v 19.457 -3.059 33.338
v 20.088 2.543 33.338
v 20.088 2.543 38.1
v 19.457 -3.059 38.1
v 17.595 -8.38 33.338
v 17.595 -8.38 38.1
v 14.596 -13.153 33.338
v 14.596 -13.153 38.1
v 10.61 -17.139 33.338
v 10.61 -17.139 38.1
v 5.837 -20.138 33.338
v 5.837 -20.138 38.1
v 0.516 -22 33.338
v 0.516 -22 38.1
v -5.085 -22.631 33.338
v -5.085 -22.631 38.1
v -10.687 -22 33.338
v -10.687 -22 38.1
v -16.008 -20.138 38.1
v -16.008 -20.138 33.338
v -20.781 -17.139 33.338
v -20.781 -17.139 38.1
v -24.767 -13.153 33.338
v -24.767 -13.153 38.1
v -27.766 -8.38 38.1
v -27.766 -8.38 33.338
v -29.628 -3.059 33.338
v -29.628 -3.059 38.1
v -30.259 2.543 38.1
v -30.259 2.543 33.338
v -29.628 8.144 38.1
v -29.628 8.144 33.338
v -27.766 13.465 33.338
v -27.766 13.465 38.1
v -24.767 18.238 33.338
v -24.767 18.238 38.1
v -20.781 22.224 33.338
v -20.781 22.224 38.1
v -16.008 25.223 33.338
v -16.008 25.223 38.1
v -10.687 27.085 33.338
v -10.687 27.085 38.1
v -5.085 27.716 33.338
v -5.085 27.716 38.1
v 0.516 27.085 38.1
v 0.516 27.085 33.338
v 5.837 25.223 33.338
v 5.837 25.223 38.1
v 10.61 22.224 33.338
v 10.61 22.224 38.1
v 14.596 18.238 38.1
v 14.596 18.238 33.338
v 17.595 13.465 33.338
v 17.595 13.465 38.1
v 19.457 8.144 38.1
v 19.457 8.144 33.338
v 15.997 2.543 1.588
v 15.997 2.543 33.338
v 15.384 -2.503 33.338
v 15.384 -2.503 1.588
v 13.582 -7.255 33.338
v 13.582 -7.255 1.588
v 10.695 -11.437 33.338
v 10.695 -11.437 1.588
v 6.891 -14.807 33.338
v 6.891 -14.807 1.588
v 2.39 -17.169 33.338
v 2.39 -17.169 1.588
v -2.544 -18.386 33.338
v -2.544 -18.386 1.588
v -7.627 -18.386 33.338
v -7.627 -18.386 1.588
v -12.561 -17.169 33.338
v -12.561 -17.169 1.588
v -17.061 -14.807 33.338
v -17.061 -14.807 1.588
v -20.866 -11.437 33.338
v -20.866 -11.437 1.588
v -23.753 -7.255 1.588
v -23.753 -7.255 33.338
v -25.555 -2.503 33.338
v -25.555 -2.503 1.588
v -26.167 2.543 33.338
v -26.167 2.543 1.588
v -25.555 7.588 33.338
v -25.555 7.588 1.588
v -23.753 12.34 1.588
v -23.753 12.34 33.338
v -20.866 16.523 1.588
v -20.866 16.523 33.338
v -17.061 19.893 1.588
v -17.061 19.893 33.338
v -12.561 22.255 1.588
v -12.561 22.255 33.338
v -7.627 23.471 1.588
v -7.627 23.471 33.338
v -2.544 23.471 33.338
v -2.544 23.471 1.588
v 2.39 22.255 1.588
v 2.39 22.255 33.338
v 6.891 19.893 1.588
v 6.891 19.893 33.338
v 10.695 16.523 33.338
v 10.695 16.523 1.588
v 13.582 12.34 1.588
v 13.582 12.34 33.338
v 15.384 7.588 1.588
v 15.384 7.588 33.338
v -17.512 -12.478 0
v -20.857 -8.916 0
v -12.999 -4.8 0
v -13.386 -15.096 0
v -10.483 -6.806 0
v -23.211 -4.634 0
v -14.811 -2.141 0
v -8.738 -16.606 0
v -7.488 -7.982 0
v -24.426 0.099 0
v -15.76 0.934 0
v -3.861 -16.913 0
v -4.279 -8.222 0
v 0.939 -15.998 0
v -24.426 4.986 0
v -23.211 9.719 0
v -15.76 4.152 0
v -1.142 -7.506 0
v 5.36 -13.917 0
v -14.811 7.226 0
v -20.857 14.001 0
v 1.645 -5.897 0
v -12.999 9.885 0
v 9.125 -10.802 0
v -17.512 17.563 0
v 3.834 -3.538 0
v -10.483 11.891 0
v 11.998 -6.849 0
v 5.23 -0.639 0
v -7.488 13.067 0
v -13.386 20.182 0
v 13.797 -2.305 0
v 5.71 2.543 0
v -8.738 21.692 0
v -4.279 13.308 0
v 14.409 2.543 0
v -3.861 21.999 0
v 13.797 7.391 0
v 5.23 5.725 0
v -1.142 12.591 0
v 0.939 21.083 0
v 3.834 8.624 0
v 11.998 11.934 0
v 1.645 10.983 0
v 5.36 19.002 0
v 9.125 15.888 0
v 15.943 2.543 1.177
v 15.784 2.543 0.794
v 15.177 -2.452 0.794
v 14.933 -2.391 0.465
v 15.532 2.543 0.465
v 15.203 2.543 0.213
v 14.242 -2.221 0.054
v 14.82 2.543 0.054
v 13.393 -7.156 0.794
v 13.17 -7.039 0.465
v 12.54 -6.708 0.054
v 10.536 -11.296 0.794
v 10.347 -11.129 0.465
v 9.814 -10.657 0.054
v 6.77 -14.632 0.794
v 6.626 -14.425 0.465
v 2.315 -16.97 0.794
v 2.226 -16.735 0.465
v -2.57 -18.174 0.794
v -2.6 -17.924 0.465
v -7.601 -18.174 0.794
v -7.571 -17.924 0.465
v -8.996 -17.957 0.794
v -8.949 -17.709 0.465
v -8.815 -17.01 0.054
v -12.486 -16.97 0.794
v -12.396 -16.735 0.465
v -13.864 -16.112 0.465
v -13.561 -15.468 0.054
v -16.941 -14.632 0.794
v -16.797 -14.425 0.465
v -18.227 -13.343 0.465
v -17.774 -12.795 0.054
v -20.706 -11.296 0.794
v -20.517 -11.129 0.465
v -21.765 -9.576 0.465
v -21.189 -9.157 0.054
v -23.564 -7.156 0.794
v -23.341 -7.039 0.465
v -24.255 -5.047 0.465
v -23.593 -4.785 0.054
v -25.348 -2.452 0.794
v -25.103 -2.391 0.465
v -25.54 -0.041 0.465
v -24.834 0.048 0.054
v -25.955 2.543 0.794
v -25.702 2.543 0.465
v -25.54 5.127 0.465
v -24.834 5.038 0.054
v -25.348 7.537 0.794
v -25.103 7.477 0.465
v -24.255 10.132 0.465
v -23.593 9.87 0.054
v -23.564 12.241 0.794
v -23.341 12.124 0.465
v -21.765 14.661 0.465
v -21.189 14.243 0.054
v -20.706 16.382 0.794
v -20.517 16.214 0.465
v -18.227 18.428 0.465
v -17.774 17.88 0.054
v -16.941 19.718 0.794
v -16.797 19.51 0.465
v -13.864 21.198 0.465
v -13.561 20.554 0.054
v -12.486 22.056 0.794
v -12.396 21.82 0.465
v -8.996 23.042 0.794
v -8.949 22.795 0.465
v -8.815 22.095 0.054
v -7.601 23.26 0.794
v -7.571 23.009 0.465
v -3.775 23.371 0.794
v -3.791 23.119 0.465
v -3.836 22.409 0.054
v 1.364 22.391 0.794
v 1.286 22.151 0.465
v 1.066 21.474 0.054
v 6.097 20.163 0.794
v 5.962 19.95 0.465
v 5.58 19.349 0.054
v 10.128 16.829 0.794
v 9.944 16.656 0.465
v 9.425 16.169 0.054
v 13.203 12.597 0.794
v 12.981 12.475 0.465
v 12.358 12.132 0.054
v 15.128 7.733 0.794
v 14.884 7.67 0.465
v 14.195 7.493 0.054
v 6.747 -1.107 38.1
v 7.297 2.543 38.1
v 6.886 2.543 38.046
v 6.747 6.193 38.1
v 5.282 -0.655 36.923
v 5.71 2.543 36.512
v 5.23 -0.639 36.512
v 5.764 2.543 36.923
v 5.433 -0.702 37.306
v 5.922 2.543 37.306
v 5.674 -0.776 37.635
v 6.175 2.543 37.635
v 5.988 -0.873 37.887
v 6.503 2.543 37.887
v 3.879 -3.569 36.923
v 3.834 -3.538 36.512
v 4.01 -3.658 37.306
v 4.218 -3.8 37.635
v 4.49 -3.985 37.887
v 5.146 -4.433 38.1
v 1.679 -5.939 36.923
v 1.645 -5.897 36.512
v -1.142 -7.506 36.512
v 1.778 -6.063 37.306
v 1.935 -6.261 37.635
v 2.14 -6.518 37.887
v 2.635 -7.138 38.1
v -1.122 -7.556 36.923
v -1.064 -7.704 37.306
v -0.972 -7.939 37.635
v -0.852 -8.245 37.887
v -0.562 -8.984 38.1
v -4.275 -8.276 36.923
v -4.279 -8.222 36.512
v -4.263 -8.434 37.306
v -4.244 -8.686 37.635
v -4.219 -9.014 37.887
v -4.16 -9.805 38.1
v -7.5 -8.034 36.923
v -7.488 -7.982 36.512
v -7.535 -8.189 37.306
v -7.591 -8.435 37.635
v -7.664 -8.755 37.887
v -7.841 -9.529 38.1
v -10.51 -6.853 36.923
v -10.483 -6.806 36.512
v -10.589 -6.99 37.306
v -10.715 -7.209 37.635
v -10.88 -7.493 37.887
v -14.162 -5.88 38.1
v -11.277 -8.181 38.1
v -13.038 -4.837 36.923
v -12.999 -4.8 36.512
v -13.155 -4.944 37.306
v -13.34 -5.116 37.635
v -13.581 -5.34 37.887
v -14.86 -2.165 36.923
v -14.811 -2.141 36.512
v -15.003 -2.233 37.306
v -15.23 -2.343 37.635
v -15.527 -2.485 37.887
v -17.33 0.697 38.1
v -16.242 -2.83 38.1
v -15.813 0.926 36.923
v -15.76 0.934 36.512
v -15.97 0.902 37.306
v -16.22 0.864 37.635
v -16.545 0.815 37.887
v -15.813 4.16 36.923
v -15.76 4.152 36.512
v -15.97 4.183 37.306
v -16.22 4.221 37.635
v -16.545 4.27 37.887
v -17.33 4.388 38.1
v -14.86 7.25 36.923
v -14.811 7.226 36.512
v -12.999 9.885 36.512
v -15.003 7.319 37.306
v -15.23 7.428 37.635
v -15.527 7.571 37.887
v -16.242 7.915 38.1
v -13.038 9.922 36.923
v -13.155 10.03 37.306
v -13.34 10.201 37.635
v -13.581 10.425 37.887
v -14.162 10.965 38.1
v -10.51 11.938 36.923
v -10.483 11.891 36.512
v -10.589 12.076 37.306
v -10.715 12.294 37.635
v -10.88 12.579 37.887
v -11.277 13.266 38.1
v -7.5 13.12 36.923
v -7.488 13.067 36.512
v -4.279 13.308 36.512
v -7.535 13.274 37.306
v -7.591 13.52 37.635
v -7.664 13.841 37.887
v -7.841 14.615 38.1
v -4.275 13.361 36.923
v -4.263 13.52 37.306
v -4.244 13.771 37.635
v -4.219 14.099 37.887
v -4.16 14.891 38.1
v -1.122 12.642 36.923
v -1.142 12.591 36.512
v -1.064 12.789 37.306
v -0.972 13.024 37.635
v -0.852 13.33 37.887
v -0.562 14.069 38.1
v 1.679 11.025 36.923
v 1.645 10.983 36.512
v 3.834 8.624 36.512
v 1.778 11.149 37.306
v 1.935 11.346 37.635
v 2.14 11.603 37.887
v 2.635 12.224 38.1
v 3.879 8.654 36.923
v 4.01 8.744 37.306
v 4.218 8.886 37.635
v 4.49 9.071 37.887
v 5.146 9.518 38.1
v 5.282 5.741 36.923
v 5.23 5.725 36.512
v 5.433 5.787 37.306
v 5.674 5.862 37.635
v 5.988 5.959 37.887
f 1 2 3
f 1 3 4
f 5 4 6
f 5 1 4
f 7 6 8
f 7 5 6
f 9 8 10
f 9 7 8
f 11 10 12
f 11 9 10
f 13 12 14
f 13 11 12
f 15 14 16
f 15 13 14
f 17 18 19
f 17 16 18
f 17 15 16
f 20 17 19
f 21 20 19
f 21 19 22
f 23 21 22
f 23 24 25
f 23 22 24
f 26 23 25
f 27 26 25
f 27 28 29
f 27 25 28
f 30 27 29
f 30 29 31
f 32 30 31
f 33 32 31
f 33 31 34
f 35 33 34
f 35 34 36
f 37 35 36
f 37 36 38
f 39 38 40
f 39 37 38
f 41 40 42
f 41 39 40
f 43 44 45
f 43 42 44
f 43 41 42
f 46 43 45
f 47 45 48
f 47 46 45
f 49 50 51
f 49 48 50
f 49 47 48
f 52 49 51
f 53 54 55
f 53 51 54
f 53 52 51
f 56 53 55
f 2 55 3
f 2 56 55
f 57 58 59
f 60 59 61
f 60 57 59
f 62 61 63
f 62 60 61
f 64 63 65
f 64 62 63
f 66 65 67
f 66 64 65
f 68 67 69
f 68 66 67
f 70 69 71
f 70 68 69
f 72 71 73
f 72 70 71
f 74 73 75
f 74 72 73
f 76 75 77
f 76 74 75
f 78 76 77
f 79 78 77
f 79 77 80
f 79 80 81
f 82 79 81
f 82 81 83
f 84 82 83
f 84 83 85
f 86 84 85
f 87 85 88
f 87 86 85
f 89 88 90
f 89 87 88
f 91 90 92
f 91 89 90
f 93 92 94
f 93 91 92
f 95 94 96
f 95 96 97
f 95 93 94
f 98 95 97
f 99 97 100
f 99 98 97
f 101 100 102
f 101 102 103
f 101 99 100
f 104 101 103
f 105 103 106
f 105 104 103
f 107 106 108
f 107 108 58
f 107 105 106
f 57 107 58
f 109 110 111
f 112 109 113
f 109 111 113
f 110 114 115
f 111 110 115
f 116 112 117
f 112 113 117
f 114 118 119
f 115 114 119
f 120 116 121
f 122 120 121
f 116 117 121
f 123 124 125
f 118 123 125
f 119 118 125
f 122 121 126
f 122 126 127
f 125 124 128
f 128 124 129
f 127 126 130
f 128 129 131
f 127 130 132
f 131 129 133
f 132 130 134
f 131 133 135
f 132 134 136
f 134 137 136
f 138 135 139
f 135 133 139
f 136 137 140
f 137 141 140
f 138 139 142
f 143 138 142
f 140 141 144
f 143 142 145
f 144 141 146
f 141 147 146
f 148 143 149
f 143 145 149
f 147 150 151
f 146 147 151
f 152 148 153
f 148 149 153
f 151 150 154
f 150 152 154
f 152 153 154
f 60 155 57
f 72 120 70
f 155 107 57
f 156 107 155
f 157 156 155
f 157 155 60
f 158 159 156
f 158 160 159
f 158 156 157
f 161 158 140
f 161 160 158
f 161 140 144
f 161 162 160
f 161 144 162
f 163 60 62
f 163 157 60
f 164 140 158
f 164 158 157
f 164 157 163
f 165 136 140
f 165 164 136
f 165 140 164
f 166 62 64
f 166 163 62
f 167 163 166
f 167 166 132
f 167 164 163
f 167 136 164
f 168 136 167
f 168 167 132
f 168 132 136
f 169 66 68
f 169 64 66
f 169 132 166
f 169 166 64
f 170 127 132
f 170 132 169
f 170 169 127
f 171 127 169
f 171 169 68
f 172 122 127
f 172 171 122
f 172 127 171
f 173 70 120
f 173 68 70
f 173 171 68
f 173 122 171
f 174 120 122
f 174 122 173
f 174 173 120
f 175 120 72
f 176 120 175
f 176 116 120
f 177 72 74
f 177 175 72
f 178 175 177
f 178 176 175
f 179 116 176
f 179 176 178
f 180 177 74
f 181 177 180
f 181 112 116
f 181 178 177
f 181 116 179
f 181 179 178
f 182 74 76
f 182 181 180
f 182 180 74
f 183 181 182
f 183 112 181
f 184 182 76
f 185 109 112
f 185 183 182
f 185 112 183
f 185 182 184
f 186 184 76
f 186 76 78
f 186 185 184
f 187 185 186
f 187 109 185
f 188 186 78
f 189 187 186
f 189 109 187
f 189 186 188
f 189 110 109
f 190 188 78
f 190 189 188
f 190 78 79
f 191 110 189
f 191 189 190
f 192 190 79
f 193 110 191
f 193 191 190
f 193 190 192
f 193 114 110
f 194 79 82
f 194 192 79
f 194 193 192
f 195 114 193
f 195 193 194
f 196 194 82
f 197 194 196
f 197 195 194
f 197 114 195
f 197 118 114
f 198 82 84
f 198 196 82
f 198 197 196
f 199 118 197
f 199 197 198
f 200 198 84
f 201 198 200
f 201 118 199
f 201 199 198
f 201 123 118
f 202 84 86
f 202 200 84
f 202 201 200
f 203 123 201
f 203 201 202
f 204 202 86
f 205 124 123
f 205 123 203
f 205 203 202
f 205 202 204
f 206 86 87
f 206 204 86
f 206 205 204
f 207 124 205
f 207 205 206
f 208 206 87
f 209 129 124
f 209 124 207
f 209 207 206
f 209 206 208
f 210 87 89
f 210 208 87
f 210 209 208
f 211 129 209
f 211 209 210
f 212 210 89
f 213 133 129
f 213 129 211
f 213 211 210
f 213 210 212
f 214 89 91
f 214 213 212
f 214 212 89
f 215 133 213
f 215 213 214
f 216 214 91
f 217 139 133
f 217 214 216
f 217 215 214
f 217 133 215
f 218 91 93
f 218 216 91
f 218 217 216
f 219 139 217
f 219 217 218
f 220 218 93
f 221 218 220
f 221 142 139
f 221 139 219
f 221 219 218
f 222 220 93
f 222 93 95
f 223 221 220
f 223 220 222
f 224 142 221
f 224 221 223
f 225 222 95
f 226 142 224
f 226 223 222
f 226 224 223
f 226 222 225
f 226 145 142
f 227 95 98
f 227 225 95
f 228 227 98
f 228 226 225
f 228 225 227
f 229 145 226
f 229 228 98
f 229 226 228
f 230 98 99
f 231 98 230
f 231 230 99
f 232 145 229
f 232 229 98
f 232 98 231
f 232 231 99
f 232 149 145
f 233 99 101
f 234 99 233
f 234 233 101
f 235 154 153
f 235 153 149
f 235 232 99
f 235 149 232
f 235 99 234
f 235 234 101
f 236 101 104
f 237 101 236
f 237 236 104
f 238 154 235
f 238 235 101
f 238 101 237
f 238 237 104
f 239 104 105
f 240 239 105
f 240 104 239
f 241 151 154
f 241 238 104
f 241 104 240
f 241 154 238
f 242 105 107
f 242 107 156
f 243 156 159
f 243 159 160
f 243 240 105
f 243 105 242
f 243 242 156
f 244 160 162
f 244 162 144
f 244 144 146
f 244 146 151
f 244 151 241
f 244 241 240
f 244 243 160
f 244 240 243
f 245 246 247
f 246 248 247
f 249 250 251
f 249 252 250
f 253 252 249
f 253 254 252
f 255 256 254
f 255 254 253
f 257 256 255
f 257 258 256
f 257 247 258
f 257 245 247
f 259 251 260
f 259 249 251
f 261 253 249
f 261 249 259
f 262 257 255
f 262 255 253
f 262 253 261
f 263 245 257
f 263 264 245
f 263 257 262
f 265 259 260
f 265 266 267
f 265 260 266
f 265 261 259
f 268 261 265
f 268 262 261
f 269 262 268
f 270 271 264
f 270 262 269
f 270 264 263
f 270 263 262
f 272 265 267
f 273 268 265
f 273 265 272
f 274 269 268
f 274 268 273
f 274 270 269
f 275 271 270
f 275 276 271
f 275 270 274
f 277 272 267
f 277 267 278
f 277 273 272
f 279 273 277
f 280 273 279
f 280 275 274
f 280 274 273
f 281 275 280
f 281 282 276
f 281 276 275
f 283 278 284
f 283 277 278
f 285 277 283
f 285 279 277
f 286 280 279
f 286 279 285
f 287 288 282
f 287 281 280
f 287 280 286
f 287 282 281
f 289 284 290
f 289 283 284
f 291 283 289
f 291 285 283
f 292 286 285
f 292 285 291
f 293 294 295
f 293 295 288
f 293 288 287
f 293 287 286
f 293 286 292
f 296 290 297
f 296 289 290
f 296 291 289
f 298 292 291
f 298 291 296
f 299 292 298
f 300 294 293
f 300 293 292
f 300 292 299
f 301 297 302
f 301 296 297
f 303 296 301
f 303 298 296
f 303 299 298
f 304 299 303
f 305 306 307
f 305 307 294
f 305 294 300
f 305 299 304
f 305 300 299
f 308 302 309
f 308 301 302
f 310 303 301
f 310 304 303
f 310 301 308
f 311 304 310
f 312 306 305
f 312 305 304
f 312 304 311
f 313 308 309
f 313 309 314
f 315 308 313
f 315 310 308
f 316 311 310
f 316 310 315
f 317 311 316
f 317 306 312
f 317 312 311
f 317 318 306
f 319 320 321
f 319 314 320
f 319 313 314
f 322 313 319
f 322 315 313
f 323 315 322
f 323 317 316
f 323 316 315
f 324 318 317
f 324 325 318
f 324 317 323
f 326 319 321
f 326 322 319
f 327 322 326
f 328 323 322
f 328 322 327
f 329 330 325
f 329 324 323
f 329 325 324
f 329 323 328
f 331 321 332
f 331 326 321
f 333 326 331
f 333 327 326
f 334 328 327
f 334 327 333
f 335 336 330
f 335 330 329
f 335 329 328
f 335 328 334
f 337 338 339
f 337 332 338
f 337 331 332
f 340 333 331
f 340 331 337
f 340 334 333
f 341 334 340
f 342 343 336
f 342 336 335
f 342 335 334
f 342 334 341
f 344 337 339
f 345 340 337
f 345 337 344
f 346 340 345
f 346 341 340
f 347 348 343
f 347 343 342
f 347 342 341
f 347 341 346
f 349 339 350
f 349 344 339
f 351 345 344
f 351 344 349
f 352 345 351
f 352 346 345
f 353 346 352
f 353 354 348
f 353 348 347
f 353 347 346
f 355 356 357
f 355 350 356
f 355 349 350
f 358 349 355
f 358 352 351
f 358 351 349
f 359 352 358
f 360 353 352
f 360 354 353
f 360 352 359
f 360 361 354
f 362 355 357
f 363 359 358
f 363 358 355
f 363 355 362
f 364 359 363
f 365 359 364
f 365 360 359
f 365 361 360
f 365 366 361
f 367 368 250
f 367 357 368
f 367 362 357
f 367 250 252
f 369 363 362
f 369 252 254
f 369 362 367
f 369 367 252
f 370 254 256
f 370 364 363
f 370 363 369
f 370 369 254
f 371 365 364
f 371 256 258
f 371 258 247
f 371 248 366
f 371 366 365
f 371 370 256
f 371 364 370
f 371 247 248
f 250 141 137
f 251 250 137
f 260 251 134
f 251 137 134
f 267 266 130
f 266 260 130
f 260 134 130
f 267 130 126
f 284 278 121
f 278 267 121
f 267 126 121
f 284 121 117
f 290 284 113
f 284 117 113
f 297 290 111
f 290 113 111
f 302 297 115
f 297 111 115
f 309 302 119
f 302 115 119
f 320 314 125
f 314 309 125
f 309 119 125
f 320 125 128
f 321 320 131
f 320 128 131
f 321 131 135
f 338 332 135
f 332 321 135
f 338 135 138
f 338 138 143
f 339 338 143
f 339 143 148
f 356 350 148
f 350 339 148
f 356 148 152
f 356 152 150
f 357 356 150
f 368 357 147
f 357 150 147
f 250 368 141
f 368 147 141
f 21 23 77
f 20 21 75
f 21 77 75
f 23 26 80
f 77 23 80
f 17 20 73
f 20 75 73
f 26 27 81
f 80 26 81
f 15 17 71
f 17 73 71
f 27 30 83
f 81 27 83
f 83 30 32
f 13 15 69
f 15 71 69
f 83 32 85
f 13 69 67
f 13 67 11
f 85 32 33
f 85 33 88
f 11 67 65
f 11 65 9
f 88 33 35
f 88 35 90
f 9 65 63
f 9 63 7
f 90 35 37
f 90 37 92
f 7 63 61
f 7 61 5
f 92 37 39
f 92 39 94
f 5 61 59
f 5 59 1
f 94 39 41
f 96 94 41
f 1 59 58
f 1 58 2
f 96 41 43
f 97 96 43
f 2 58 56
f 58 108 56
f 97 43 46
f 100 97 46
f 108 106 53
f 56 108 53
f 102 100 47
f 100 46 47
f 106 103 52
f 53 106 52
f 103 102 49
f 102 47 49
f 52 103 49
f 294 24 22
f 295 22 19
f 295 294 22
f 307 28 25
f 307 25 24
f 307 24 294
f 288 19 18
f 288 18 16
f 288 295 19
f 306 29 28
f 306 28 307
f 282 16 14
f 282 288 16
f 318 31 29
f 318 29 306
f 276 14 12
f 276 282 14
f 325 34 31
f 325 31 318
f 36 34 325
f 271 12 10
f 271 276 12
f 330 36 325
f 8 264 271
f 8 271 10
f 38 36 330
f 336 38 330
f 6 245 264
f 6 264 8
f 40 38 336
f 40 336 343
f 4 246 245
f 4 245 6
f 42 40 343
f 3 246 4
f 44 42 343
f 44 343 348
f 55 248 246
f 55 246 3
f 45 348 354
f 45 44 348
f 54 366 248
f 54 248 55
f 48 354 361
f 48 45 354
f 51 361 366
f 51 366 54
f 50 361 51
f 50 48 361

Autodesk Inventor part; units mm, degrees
ref_plane "YZ Plane" through (0, 0, 0) normal (1, 0, 0) x (0, 1, 0)
ref_plane "XZ Plane" through (0, 0, 0) normal (0, 1, 0) x (-1, 0, 0)
ref_plane "XY Plane" through (0, 0, 0) normal (0, 0, 1) x (1, 0, 0)
sketch "Sketch1" plane through (0, 0, 0) normal (0, 0, 1) x (1, 0, 0)
  circle A0 centre (-5.0854, 2.5427) radius 10.795
  circle A1 centre (-5.0854, 2.5427) radius 21.082
  point P0 (0, 0)
  dimension "d0" = 21.59
  dimension "d1" = 42.164
extrude "Extrusion1" add sketch "Sketch1" along normal blind 38.1
ref_plane "Work Plane1" through (-5.0854, 2.5427, 33.3375) normal (0, 0, 1) x (1, 0, 0)
sketch "Sketch2" plane through (-5.0854, 2.5427, 33.3375) normal (0, 0, 1) x (1, 0, 0)
  circle A0 centre (0, 0) radius 10.795
  circle A1 centre (0, 0) radius 25.1734
  point P0 (5.0854, -2.5427)
extrude "Extrusion2" add sketch "Sketch2" along normal blind 4.7625
fillet "Fillet1" radius 1.5875 2 edges at (-15.8804, 2.5427, 38.1) (-26.1674, 2.5427, 0)
properties part number "pvcconnector"
